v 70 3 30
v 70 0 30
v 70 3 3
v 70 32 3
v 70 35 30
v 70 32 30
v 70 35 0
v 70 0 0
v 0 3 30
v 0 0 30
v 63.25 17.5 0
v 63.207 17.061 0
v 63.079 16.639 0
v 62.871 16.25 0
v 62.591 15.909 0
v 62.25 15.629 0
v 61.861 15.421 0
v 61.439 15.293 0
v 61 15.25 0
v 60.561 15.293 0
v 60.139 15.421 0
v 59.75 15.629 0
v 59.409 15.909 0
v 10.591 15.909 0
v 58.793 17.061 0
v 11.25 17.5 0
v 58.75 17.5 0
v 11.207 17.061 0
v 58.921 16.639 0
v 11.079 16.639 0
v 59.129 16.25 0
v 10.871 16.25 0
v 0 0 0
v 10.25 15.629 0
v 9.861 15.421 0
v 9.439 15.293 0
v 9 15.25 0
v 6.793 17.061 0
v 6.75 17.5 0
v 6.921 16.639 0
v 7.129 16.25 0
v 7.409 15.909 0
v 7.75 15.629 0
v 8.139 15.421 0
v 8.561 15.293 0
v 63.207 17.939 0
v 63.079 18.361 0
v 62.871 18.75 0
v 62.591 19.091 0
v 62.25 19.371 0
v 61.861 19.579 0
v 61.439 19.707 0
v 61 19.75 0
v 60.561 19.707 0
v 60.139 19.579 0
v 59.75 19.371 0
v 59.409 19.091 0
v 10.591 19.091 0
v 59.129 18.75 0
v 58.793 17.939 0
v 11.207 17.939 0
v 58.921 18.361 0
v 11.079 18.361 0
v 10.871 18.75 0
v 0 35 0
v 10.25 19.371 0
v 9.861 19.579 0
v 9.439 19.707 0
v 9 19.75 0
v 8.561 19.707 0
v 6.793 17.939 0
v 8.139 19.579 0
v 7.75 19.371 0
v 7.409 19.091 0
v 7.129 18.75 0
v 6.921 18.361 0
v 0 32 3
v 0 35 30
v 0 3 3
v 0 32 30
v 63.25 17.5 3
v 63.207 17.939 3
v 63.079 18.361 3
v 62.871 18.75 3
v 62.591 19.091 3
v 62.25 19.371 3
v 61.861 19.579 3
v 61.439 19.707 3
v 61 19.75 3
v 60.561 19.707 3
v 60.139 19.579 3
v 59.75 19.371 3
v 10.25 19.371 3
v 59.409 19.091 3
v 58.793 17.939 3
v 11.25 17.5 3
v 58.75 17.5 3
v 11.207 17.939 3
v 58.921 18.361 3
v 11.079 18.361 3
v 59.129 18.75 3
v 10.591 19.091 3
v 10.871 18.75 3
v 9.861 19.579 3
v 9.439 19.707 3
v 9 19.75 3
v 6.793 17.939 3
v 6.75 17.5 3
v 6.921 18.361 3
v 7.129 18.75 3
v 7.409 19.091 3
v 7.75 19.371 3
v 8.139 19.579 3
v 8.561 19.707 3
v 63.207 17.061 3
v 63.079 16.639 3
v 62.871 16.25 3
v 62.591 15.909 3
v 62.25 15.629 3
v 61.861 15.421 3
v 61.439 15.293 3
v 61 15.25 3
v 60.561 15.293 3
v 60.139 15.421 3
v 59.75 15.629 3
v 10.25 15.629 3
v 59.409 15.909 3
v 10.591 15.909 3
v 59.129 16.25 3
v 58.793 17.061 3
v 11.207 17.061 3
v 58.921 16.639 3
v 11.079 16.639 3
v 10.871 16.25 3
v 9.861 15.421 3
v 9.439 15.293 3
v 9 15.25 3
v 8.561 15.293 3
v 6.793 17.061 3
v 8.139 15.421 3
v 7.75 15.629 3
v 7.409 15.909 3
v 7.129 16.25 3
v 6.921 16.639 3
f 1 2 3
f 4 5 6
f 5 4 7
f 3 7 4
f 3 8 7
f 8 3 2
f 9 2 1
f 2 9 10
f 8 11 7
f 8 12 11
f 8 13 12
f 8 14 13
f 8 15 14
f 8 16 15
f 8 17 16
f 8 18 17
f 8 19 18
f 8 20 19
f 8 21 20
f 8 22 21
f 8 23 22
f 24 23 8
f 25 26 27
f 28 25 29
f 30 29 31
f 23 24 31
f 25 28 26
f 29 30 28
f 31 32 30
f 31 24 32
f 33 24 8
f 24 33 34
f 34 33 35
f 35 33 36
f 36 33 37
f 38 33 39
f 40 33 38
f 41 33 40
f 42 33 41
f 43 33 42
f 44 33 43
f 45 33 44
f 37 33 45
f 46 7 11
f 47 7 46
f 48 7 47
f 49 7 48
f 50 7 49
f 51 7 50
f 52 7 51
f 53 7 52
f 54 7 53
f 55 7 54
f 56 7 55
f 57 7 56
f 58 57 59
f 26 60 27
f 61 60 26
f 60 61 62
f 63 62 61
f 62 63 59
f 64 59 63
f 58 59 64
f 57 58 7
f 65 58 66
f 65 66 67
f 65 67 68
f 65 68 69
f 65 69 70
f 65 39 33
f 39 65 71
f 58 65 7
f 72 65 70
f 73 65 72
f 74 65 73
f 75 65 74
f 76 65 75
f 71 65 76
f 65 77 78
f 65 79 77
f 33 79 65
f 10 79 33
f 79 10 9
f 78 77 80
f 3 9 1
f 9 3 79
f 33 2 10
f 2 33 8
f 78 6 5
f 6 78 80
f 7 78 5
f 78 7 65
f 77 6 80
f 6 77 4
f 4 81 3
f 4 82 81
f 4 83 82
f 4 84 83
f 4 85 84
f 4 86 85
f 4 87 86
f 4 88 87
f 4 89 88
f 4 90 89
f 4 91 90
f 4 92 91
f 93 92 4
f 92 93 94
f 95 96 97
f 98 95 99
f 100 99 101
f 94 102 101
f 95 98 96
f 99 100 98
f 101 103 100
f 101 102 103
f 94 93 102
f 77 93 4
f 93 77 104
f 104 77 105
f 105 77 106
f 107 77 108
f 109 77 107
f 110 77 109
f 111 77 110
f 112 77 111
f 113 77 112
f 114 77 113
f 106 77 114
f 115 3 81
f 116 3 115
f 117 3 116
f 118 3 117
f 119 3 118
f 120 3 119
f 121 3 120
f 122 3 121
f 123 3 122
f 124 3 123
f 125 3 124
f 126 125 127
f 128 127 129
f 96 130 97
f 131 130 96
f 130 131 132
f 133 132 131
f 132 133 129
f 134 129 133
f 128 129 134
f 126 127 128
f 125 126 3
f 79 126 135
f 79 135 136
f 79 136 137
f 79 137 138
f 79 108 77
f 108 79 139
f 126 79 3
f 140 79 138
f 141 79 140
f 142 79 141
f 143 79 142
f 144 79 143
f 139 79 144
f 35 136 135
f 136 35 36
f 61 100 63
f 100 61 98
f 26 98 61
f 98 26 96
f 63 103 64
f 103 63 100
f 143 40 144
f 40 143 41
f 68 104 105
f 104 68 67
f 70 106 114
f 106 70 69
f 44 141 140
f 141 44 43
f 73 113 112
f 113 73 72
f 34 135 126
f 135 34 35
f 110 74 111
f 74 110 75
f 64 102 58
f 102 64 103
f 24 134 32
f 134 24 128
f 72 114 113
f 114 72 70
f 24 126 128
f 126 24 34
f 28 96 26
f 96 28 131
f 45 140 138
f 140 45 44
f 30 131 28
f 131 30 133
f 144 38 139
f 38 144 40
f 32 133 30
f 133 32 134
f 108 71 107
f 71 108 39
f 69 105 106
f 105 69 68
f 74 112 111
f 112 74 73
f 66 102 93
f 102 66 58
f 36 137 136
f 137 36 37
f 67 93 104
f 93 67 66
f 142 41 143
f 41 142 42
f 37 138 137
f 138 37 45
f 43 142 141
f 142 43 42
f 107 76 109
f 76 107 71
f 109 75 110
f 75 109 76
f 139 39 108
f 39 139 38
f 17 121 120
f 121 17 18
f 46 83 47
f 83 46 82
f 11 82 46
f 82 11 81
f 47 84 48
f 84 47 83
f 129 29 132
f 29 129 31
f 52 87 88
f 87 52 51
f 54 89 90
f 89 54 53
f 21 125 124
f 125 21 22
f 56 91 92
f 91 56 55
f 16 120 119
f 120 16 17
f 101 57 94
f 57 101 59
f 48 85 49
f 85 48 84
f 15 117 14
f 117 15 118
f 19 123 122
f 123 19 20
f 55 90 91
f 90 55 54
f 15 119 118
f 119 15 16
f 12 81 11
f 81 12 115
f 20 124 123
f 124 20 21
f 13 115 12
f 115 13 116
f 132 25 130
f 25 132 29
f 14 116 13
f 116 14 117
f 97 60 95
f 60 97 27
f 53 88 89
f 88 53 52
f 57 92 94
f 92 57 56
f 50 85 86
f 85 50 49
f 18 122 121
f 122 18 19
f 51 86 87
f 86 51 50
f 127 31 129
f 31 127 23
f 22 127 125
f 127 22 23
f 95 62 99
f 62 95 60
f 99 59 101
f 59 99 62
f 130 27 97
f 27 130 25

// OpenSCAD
$fn = 32;

// ----------------------------------------------------------------------
// U-bracket: 70 x 35 x 30 mm
// ----------------------------------------------------------------------

// --- parameters (mm) ---
length = 70;              // outer length, X
width = 35;               // outer width, Y
height = 30;              // upright height, Z
thick = 3;                // wall thickness
hole_d = 4.5;             // clearance for M4

module hole_z(px, py) {
  translate([px, py, -2.5]) cylinder(h = thick + 5, d = hole_d);
}
module hole_y_pz(pz) {
  /* through both uprights along Y */
  translate([0, -2.5, pz]) rotate([-90, 0, 0]) cylinder(h = width + 5, d = hole_d);
}

module base() {
  cube([length, width, thick]);
}

module uprights() {
  cube([length, thick, height]);
  translate([0, width - thick, 0]) cube([length, thick, height]);
}

difference() {
  union() {
    base();
    uprights();
  }
  hole_z(9, 17.5);
  hole_z(61, 17.5);
}
